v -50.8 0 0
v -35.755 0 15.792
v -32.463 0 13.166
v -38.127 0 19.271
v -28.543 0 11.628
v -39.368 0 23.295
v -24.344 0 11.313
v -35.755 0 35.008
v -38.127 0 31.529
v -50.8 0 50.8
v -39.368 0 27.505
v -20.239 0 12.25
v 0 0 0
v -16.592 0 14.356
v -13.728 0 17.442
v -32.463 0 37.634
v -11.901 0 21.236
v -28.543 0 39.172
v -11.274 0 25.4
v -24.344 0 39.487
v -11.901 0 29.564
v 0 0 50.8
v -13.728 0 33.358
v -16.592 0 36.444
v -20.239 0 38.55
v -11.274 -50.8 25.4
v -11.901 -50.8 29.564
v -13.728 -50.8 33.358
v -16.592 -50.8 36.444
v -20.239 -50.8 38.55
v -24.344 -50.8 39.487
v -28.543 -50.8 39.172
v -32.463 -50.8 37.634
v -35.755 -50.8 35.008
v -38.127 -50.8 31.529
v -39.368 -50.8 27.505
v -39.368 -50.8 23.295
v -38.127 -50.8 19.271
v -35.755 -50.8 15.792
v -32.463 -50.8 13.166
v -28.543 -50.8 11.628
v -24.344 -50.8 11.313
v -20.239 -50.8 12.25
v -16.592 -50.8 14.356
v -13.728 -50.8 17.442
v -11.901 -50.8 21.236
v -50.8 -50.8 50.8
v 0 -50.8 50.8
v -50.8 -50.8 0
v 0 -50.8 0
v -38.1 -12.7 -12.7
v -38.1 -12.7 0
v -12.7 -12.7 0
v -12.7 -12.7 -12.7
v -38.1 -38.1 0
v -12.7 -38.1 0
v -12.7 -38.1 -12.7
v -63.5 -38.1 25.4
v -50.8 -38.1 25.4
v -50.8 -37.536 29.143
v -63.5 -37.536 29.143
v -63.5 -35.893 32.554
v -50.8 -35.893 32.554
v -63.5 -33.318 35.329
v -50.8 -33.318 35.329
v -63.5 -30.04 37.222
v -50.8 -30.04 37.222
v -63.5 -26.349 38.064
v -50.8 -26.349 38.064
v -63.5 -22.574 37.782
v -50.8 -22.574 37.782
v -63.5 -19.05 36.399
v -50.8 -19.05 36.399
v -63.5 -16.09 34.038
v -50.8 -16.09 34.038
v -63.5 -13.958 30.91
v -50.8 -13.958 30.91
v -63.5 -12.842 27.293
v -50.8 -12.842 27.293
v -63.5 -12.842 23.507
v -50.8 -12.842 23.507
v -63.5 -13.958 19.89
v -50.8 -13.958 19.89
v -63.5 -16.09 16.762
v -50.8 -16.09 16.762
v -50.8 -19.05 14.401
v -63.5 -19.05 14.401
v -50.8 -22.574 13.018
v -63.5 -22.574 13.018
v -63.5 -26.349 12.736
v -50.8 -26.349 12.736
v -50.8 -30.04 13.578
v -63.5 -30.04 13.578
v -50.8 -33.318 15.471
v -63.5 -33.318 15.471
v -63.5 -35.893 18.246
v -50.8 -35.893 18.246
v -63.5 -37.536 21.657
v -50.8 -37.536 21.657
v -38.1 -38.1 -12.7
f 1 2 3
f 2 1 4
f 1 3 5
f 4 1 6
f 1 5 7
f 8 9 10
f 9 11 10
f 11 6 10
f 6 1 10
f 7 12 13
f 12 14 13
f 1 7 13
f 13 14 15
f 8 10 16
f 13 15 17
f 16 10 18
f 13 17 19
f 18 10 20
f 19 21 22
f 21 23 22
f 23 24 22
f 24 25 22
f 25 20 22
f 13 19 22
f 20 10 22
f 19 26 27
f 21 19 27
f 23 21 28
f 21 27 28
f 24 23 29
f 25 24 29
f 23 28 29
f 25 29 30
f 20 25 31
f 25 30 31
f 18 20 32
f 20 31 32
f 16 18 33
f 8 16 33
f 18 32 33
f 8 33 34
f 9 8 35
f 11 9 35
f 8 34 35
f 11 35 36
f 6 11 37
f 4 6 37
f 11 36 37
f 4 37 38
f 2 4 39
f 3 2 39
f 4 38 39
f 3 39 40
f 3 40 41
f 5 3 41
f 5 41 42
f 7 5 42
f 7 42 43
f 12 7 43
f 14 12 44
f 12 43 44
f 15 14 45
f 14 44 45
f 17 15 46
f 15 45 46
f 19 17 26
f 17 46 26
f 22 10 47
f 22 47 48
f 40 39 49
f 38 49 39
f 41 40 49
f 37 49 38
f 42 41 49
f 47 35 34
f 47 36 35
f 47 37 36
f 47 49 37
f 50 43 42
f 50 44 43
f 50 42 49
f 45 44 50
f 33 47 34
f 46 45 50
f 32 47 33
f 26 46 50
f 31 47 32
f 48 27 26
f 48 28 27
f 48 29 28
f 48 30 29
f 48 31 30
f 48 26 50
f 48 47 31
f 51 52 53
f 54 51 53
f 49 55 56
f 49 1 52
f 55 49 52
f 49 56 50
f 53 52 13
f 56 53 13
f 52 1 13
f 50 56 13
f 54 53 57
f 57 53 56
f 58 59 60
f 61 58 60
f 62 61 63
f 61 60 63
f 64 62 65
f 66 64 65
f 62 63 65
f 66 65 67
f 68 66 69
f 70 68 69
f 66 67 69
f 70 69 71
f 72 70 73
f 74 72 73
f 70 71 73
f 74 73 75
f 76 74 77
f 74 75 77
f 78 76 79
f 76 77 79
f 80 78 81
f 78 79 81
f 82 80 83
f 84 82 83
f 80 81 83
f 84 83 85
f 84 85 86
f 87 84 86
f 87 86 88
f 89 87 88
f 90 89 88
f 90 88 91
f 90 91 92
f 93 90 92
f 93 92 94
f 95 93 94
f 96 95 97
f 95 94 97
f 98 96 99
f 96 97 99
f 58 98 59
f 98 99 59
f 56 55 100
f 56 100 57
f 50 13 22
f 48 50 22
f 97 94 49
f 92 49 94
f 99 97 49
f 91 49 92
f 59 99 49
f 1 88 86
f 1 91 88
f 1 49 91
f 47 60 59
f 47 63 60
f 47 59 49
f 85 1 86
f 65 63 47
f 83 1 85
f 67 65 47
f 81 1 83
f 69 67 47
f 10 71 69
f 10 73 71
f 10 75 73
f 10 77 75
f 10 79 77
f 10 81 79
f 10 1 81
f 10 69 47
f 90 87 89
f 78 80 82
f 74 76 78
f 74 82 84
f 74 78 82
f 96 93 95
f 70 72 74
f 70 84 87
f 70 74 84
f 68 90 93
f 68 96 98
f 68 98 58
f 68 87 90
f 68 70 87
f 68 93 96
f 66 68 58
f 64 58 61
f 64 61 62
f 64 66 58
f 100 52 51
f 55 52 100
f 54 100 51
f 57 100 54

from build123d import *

# Parameters (mm, degrees)
F0_W     = 50.8
F0_H     = 50.8
F1_DEPTH = 50.8
F2_R     = 14.126259
F3_DEPTH = 50.8
F4_W     = 25.4
F4_H     = 25.4
F5_DEPTH = 12.7
F6_R     = 12.7
F7_DEPTH = 12.7


with BuildPart() as f1:
    # F0 (on Front) → F1 (new body)
    with BuildSketch(Plane.XZ):
        with Locations((-25.4, 25.4)):
            Rectangle(F0_W, F0_H)
    extrude(amount=F1_DEPTH)

    # F2 (on face) → F3 (cut)
    with BuildSketch(Plane.XZ.offset(50.8)):
        with Locations((-25.4, 25.4)):
            Circle(F2_R)
    extrude(amount=-F3_DEPTH, mode=Mode.SUBTRACT)

    # F4 (on face) → F5 (join)
    with BuildSketch(Plane(origin=(0, 0, 0), x_dir=(1, 0, 0), z_dir=(0, 0, -1))):
        with Locations((-25.4, 25.4)):
            Rectangle(F4_W, F4_H)
    extrude(amount=F5_DEPTH)

    # F6 (on face) → F7 (join)
    with BuildSketch(Plane(origin=(-50.8, 0, 0), x_dir=(0, -1, 0), z_dir=(-1, 0, 0))):
        with Locations((25.4, 25.4)):
            Circle(F6_R)
    extrude(amount=F7_DEPTH)


solid = f1.part
